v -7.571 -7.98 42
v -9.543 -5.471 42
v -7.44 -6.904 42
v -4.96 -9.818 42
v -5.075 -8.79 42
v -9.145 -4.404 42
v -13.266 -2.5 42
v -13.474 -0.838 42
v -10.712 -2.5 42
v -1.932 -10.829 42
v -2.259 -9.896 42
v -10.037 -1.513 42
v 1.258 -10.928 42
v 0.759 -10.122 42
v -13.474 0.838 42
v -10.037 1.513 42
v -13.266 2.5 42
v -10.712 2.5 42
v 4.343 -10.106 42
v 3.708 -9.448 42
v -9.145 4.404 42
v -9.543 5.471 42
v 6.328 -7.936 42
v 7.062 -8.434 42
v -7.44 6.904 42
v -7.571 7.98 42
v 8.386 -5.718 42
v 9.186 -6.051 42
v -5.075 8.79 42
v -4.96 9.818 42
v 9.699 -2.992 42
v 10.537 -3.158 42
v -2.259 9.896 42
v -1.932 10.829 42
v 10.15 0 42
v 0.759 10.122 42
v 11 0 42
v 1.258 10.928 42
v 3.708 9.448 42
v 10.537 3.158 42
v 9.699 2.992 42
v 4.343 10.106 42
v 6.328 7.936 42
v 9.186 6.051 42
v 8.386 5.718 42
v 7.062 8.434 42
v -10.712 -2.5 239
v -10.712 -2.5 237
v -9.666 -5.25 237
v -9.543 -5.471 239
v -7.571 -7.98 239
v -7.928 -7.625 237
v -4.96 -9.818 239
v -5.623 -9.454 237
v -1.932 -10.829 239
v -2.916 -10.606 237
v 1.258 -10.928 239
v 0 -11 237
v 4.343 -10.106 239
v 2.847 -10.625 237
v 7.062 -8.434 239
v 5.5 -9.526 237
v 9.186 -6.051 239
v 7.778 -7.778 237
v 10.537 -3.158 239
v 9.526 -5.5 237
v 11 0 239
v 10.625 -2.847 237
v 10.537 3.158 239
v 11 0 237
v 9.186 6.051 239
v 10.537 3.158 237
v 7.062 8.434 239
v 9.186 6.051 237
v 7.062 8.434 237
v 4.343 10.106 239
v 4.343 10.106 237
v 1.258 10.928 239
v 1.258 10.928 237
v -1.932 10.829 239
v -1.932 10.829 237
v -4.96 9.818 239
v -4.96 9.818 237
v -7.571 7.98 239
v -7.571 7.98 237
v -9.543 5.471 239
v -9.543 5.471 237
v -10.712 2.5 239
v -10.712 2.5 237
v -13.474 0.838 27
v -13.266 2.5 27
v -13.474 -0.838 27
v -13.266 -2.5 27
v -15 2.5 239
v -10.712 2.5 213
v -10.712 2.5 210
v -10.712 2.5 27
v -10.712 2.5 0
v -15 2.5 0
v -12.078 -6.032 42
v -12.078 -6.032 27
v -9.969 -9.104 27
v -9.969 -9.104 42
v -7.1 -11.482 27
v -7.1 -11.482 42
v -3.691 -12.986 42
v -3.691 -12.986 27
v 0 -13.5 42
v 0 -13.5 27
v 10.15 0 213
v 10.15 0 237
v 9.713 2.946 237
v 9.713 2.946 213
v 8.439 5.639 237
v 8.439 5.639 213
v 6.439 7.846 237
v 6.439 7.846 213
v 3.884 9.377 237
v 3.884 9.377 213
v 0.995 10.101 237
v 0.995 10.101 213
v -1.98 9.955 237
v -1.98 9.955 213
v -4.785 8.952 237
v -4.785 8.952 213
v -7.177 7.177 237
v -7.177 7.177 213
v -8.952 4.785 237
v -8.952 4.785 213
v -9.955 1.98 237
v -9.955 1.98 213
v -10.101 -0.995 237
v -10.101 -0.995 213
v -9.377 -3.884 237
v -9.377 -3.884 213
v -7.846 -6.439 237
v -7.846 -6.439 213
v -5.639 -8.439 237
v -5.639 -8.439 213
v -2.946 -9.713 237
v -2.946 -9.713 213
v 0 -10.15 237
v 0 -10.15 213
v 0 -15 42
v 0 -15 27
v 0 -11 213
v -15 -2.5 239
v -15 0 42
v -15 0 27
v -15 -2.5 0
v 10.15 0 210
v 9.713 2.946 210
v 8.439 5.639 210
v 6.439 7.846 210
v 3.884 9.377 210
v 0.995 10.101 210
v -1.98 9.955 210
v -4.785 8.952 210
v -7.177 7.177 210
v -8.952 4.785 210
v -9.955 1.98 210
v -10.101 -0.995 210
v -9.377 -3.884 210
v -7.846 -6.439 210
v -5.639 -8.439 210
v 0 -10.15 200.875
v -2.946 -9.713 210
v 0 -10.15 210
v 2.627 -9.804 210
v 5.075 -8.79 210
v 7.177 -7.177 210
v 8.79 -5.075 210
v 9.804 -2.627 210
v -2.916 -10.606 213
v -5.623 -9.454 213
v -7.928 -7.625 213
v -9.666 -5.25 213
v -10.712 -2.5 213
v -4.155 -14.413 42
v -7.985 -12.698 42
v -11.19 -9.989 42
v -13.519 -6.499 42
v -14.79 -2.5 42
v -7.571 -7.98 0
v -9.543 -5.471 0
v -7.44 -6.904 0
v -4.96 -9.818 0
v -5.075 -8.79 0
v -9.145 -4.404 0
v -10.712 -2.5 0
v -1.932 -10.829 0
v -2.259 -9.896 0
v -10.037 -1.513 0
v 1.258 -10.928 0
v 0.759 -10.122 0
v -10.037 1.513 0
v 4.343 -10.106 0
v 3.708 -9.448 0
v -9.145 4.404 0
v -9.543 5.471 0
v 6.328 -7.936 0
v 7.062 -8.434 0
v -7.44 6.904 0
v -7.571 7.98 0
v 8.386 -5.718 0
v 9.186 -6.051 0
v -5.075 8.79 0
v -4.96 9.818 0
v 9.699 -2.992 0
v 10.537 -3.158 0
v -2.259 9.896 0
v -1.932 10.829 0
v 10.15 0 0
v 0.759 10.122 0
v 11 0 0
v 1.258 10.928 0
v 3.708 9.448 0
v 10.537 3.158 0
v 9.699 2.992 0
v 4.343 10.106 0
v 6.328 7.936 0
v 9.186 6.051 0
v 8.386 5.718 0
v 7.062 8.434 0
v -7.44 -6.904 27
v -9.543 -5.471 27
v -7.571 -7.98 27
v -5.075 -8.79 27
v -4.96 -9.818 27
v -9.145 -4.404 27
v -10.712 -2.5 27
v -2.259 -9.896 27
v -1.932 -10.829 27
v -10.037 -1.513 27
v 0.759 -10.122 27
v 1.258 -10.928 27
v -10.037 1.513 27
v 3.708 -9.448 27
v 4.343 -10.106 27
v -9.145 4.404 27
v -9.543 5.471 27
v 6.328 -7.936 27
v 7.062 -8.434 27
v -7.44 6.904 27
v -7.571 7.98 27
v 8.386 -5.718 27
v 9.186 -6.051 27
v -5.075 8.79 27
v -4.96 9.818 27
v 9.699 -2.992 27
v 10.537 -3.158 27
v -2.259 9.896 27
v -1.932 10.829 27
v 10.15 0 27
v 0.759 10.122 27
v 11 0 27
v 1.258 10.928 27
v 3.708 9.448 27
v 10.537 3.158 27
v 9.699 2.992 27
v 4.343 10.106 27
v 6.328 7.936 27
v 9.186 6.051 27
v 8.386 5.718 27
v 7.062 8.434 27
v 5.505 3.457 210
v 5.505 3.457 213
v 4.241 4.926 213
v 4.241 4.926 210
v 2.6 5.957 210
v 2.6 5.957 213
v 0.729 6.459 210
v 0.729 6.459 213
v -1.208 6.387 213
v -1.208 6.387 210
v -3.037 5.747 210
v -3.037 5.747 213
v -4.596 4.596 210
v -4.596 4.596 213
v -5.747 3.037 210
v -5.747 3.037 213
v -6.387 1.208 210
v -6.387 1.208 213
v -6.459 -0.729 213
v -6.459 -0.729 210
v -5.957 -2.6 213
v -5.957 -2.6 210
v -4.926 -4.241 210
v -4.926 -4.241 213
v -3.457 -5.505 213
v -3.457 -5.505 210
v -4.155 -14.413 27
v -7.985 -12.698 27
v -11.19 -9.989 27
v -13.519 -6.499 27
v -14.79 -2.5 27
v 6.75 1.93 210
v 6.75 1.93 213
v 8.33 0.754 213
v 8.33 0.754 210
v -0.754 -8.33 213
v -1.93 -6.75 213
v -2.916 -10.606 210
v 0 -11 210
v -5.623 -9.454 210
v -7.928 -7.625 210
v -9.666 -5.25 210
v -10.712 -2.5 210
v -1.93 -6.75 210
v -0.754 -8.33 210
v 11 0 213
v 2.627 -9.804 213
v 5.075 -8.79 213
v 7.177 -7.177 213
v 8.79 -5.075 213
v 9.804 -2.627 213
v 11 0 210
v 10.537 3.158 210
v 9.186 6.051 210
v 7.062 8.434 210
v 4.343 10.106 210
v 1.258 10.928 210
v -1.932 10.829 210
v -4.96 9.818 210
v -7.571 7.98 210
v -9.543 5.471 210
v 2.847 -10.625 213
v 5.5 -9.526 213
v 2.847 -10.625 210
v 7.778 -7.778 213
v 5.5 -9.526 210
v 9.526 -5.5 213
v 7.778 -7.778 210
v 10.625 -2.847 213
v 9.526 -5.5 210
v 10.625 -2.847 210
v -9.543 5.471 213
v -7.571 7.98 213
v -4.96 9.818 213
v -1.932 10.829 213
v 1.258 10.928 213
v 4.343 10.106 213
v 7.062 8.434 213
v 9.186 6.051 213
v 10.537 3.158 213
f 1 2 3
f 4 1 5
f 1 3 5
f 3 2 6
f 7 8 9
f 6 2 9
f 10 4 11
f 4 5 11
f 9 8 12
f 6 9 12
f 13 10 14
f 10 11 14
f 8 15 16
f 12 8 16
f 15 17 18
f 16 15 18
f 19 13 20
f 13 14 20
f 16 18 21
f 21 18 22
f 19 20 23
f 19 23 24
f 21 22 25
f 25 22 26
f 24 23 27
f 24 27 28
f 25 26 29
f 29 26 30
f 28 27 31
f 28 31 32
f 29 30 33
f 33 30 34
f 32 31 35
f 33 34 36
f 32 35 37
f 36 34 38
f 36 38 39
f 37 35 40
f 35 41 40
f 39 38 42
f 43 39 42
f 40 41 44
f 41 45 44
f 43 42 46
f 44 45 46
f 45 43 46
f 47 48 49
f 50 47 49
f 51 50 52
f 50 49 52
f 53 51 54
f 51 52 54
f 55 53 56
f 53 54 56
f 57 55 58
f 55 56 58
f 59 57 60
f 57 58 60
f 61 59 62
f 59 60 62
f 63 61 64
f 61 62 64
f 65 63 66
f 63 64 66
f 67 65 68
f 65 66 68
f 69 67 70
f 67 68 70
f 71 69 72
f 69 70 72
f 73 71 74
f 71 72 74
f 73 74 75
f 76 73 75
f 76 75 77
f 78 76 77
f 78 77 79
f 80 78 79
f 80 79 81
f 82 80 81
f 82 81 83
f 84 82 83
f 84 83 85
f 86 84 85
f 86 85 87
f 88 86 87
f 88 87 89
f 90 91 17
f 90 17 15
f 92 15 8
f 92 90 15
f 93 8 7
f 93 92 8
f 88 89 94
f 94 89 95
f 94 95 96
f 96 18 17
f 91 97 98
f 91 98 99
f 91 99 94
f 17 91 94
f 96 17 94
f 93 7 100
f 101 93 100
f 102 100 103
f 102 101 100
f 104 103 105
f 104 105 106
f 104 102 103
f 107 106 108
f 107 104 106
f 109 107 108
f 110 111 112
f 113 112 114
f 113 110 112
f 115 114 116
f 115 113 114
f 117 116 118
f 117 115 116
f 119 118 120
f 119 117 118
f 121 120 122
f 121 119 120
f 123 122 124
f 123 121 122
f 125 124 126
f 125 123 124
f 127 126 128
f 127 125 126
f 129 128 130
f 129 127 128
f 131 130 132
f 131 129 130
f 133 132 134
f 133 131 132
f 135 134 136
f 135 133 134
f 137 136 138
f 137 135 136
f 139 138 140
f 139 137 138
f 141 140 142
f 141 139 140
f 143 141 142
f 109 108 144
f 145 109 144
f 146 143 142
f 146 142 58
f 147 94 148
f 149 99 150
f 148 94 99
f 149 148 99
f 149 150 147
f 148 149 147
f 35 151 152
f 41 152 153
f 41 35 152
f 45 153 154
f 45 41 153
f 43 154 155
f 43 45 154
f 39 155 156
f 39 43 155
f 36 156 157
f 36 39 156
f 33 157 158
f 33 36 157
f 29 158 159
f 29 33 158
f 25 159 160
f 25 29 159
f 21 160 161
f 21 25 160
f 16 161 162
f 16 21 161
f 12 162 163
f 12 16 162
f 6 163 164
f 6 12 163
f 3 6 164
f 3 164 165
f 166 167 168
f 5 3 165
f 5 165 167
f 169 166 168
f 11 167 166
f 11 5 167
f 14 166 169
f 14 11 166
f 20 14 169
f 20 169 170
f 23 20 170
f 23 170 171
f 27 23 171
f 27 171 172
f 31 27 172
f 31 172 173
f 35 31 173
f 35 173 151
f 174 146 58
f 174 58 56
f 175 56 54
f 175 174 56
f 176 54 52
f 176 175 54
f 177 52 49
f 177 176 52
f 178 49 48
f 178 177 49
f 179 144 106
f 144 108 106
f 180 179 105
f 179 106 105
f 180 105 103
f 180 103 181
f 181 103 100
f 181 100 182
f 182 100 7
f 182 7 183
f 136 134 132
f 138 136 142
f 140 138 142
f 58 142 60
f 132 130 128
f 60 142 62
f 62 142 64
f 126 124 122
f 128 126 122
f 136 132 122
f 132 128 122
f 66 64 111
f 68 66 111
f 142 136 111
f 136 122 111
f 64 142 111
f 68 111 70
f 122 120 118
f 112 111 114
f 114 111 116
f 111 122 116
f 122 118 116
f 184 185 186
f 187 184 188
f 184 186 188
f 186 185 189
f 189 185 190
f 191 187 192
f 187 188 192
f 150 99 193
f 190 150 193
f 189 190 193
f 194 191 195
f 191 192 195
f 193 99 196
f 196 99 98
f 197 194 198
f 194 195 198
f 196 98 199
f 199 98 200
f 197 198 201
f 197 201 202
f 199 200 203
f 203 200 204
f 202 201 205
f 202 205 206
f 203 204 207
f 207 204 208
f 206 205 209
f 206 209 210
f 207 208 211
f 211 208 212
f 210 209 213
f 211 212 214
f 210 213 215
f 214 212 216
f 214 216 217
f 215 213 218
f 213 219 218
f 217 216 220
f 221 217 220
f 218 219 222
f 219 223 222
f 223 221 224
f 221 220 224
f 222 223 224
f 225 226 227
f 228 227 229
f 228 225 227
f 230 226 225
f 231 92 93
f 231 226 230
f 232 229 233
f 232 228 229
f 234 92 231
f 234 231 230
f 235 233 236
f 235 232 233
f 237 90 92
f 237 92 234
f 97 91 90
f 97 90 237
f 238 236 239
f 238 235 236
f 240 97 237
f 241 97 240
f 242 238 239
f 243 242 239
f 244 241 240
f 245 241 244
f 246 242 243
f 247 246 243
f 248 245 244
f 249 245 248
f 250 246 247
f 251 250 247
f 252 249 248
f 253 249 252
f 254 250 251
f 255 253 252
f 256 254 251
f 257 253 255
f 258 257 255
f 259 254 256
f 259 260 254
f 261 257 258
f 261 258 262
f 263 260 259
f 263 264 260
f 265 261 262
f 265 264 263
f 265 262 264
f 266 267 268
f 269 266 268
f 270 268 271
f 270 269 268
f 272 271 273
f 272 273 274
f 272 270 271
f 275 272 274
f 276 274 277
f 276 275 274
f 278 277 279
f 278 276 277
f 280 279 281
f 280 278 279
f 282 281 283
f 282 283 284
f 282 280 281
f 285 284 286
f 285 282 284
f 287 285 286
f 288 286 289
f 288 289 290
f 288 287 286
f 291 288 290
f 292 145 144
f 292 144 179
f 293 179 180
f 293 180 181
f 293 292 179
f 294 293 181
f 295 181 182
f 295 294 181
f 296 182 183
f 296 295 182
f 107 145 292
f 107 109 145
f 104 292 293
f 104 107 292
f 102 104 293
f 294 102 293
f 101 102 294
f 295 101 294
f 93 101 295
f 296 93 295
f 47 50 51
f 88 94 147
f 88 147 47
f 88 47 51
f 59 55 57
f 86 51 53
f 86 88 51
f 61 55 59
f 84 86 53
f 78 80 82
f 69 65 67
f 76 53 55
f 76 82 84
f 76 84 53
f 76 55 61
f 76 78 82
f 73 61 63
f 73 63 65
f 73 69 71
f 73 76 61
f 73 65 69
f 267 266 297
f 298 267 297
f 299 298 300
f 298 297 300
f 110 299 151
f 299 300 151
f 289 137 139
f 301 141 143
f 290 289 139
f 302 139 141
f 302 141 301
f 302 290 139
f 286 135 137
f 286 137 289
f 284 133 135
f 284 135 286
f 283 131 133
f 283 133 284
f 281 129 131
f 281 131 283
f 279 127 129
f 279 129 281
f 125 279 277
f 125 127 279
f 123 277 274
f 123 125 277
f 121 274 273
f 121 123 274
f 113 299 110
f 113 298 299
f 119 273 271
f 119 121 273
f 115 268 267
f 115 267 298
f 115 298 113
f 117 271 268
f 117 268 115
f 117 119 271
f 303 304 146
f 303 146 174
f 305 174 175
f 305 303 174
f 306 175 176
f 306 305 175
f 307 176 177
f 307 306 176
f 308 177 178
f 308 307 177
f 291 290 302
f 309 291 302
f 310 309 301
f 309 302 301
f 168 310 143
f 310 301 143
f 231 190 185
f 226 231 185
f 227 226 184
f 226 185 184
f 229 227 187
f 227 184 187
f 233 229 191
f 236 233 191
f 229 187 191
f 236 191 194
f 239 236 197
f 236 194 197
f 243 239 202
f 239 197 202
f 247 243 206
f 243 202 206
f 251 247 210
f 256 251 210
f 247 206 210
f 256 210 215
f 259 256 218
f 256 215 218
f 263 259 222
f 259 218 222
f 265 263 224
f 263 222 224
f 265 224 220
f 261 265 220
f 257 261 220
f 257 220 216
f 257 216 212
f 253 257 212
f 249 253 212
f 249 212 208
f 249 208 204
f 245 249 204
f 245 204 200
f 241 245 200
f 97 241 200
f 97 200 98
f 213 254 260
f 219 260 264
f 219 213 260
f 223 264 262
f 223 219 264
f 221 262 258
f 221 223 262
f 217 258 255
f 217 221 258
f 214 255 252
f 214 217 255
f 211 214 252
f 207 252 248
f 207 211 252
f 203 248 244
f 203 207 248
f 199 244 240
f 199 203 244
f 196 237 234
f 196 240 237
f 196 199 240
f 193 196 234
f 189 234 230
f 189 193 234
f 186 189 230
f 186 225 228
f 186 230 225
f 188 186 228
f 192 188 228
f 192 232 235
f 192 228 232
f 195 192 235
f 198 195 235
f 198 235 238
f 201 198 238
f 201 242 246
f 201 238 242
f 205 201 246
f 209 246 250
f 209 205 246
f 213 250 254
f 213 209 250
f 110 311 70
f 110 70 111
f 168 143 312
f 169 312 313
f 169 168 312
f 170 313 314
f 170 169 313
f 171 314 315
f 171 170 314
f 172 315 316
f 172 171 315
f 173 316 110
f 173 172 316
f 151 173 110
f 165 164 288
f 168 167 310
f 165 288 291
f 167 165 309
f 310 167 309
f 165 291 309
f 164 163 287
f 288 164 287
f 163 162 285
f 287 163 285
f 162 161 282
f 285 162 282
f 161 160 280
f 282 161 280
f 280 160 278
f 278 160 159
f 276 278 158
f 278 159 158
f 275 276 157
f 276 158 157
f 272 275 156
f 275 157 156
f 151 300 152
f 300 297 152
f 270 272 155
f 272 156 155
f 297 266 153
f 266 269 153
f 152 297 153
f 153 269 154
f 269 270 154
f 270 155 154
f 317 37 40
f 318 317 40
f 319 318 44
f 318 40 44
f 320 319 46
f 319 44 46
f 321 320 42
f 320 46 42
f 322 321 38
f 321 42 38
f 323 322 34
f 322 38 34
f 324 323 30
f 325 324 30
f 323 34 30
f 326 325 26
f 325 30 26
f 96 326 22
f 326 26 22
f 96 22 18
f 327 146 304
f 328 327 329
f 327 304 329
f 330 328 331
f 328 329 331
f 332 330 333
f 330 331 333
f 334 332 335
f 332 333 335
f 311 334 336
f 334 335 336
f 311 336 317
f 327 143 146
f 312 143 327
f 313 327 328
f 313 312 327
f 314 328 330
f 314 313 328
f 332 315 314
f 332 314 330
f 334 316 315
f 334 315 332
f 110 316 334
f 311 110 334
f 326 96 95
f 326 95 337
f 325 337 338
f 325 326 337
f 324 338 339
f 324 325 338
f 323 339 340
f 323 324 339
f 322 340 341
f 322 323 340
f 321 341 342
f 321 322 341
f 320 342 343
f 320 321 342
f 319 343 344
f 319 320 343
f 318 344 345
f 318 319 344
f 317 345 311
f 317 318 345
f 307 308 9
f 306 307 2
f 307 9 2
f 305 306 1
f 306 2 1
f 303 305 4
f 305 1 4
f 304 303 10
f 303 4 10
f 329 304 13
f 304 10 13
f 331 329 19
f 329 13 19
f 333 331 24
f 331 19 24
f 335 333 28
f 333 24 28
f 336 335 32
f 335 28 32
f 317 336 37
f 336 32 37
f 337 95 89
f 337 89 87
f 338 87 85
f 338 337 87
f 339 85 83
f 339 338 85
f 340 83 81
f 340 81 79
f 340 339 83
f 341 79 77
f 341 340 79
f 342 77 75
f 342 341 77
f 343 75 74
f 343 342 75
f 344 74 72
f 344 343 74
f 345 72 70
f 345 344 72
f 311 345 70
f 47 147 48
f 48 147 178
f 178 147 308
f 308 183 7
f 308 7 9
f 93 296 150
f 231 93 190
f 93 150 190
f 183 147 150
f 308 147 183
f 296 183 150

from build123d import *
from build123d.topology import SkipClean

# Parameters (mm, degrees)
SCHIZZO1_R                  = 11
SCHIZZO1_R_2                = 10.15
TUBO_DEPTH                  = 210
INGRESSOCAVI_DEPTH          = 27
SCHIZZO4_R                  = 11
SCHIZZO4_R_2                = 6.5
FONDOCORSA_DEPTH            = 3
SCHIZZO5_R                  = 11
TAPPO_DEPTH                 = 2
BASEINFERIORE_DEPTH         = 239
SCHIZZO7_R                  = 13.5
TAGLIOANELLO_DEPTH          = 15
SUPPORTOANELLO_DEPTH        = 15
FACILITAZIONECAVI_DEPTH     = 3
RACCORDOFACILITAZIONECAVI_R = 8


with BuildPart() as part:
    # Schizzo1 → Tubo (new body)
    with BuildSketch(Plane.XY):
        Circle(SCHIZZO1_R)
        Circle(SCHIZZO1_R_2, mode=Mode.SUBTRACT)
    extrude(amount=TUBO_DEPTH)

    # Schizzo2 → IngressoCavi (add)
    with BuildSketch(Plane.XY.offset(210)):
        with BuildLine():
            Line((0, -10.15), (0, -11))
            ThreePointArc((0, -11), (-7.778174593, 7.778174593), (11, 0))
            Line((11, 0), (10.15, 0))
            ThreePointArc((10.15, 0), (-7.177133829, 7.177133829), (0, -10.15))
        make_face()
    extrude(amount=INGRESSOCAVI_DEPTH)

    # Schizzo4 → FondoCorsa (add)
    with SkipClean():  # the faces are left unmerged after this step: merging them gives an invalid solid
        with BuildSketch(Plane.XY.offset(210)):
            Circle(SCHIZZO4_R)
            Circle(SCHIZZO4_R_2, mode=Mode.SUBTRACT)
        extrude(amount=FONDOCORSA_DEPTH)

    # Schizzo5 → Tappo (add)
    with SkipClean():  # the faces are left unmerged after this step: merging them gives an invalid solid
        with BuildSketch(Plane.XY.offset(237)):
            Circle(SCHIZZO5_R)
        extrude(amount=TAPPO_DEPTH)
    add(part.part.scale(1), mode=Mode.REPLACE)  # the faces are merged on a copy

    # Schizzo6 → BaseInferiore (add)
    with SkipClean():  # the faces are left unmerged after this step: merging them gives an invalid solid
        with BuildSketch(Plane.XY):
            Polygon((-11, 2.5), (-15, 2.5), (-15, -2.5), (-11, -2.5), (-10.712142643, -2.5), (-10.712142643, 2.5), align=None)
        extrude(amount=BASEINFERIORE_DEPTH)

    # Schizzo7 → TaglioAnello (cut)
    with BuildSketch(Plane.XY.offset(27)):
        Circle(SCHIZZO7_R)
    extrude(amount=TAGLIOANELLO_DEPTH, mode=Mode.SUBTRACT)

    # Schizzo8 → SupportoAnello (add)
    with SkipClean():  # the faces are left unmerged after this step: merging them gives an invalid solid
        with BuildSketch(Plane.XY.offset(27)):
            with BuildLine():
                Line((-15, 0), (-13.5, 0))
                ThreePointArc((-13.5, 0), (-9.545941546, -9.545941546), (0, -13.5))
                Line((0, -13.5), (0, -15))
                ThreePointArc((0, -15), (-10.606601718, -10.606601718), (-15, 0))
            make_face()
        extrude(amount=SUPPORTOANELLO_DEPTH)

    # Schizzo9 → FacilitazioneCavi (cut)
    with SkipClean():  # the faces are left unmerged after this step: merging them gives an invalid solid
        with BuildSketch(Plane(origin=(0, 0, 210), x_dir=(-1, 0, 0), z_dir=(0, 0, -1))):
            with BuildLine():
                Line((-10.15, 0), (0, 0))
                Line((0, 0), (0, -10.15))
                ThreePointArc((0, -10.15), (-7.177133829, -7.177133829), (-10.15, 0))
            make_face()
        extrude(amount=-FACILITAZIONECAVI_DEPTH, mode=Mode.SUBTRACT)

    # RaccordoFacilitazioneCavi
    # the kernel refuses this fillet: 8 mm, written as the material it takes off along each edge
    with BuildSketch(Plane(origin=(0, -6.5, 222.125), x_dir=(0, -1, 0), z_dir=(0, 0, -1)), Plane(origin=(6.5, 0, 200.875), x_dir=(1, 0, 0), z_dir=(0, 0, 1))) as raccordofacilitazionecavi_piece_1:
        with BuildLine():
            CenterArc((5.779433498, 7.711388525), RACCORDOFACILITAZIONECAVI_R, 212.128500683, 42.43446725)
            Line((-0.995426363, 3.456829339), (-1.13092356, 3.371738155))
            ThreePointArc((-1.13092356, 3.371738155), (-0.407564337, 1.754373873), (-0.16, 0))
            Line((-0.16, 0), (0, -0.16))
            ThreePointArc((0, -0.16), (1.825, -0.16), (3.60741133, -0.15422777))
            Line((3.60741133, -0.15422777), (3.65, 0))
        make_face()
    extrude(amount=21.25, mode=Mode.SUBTRACT)


solid = part.part
